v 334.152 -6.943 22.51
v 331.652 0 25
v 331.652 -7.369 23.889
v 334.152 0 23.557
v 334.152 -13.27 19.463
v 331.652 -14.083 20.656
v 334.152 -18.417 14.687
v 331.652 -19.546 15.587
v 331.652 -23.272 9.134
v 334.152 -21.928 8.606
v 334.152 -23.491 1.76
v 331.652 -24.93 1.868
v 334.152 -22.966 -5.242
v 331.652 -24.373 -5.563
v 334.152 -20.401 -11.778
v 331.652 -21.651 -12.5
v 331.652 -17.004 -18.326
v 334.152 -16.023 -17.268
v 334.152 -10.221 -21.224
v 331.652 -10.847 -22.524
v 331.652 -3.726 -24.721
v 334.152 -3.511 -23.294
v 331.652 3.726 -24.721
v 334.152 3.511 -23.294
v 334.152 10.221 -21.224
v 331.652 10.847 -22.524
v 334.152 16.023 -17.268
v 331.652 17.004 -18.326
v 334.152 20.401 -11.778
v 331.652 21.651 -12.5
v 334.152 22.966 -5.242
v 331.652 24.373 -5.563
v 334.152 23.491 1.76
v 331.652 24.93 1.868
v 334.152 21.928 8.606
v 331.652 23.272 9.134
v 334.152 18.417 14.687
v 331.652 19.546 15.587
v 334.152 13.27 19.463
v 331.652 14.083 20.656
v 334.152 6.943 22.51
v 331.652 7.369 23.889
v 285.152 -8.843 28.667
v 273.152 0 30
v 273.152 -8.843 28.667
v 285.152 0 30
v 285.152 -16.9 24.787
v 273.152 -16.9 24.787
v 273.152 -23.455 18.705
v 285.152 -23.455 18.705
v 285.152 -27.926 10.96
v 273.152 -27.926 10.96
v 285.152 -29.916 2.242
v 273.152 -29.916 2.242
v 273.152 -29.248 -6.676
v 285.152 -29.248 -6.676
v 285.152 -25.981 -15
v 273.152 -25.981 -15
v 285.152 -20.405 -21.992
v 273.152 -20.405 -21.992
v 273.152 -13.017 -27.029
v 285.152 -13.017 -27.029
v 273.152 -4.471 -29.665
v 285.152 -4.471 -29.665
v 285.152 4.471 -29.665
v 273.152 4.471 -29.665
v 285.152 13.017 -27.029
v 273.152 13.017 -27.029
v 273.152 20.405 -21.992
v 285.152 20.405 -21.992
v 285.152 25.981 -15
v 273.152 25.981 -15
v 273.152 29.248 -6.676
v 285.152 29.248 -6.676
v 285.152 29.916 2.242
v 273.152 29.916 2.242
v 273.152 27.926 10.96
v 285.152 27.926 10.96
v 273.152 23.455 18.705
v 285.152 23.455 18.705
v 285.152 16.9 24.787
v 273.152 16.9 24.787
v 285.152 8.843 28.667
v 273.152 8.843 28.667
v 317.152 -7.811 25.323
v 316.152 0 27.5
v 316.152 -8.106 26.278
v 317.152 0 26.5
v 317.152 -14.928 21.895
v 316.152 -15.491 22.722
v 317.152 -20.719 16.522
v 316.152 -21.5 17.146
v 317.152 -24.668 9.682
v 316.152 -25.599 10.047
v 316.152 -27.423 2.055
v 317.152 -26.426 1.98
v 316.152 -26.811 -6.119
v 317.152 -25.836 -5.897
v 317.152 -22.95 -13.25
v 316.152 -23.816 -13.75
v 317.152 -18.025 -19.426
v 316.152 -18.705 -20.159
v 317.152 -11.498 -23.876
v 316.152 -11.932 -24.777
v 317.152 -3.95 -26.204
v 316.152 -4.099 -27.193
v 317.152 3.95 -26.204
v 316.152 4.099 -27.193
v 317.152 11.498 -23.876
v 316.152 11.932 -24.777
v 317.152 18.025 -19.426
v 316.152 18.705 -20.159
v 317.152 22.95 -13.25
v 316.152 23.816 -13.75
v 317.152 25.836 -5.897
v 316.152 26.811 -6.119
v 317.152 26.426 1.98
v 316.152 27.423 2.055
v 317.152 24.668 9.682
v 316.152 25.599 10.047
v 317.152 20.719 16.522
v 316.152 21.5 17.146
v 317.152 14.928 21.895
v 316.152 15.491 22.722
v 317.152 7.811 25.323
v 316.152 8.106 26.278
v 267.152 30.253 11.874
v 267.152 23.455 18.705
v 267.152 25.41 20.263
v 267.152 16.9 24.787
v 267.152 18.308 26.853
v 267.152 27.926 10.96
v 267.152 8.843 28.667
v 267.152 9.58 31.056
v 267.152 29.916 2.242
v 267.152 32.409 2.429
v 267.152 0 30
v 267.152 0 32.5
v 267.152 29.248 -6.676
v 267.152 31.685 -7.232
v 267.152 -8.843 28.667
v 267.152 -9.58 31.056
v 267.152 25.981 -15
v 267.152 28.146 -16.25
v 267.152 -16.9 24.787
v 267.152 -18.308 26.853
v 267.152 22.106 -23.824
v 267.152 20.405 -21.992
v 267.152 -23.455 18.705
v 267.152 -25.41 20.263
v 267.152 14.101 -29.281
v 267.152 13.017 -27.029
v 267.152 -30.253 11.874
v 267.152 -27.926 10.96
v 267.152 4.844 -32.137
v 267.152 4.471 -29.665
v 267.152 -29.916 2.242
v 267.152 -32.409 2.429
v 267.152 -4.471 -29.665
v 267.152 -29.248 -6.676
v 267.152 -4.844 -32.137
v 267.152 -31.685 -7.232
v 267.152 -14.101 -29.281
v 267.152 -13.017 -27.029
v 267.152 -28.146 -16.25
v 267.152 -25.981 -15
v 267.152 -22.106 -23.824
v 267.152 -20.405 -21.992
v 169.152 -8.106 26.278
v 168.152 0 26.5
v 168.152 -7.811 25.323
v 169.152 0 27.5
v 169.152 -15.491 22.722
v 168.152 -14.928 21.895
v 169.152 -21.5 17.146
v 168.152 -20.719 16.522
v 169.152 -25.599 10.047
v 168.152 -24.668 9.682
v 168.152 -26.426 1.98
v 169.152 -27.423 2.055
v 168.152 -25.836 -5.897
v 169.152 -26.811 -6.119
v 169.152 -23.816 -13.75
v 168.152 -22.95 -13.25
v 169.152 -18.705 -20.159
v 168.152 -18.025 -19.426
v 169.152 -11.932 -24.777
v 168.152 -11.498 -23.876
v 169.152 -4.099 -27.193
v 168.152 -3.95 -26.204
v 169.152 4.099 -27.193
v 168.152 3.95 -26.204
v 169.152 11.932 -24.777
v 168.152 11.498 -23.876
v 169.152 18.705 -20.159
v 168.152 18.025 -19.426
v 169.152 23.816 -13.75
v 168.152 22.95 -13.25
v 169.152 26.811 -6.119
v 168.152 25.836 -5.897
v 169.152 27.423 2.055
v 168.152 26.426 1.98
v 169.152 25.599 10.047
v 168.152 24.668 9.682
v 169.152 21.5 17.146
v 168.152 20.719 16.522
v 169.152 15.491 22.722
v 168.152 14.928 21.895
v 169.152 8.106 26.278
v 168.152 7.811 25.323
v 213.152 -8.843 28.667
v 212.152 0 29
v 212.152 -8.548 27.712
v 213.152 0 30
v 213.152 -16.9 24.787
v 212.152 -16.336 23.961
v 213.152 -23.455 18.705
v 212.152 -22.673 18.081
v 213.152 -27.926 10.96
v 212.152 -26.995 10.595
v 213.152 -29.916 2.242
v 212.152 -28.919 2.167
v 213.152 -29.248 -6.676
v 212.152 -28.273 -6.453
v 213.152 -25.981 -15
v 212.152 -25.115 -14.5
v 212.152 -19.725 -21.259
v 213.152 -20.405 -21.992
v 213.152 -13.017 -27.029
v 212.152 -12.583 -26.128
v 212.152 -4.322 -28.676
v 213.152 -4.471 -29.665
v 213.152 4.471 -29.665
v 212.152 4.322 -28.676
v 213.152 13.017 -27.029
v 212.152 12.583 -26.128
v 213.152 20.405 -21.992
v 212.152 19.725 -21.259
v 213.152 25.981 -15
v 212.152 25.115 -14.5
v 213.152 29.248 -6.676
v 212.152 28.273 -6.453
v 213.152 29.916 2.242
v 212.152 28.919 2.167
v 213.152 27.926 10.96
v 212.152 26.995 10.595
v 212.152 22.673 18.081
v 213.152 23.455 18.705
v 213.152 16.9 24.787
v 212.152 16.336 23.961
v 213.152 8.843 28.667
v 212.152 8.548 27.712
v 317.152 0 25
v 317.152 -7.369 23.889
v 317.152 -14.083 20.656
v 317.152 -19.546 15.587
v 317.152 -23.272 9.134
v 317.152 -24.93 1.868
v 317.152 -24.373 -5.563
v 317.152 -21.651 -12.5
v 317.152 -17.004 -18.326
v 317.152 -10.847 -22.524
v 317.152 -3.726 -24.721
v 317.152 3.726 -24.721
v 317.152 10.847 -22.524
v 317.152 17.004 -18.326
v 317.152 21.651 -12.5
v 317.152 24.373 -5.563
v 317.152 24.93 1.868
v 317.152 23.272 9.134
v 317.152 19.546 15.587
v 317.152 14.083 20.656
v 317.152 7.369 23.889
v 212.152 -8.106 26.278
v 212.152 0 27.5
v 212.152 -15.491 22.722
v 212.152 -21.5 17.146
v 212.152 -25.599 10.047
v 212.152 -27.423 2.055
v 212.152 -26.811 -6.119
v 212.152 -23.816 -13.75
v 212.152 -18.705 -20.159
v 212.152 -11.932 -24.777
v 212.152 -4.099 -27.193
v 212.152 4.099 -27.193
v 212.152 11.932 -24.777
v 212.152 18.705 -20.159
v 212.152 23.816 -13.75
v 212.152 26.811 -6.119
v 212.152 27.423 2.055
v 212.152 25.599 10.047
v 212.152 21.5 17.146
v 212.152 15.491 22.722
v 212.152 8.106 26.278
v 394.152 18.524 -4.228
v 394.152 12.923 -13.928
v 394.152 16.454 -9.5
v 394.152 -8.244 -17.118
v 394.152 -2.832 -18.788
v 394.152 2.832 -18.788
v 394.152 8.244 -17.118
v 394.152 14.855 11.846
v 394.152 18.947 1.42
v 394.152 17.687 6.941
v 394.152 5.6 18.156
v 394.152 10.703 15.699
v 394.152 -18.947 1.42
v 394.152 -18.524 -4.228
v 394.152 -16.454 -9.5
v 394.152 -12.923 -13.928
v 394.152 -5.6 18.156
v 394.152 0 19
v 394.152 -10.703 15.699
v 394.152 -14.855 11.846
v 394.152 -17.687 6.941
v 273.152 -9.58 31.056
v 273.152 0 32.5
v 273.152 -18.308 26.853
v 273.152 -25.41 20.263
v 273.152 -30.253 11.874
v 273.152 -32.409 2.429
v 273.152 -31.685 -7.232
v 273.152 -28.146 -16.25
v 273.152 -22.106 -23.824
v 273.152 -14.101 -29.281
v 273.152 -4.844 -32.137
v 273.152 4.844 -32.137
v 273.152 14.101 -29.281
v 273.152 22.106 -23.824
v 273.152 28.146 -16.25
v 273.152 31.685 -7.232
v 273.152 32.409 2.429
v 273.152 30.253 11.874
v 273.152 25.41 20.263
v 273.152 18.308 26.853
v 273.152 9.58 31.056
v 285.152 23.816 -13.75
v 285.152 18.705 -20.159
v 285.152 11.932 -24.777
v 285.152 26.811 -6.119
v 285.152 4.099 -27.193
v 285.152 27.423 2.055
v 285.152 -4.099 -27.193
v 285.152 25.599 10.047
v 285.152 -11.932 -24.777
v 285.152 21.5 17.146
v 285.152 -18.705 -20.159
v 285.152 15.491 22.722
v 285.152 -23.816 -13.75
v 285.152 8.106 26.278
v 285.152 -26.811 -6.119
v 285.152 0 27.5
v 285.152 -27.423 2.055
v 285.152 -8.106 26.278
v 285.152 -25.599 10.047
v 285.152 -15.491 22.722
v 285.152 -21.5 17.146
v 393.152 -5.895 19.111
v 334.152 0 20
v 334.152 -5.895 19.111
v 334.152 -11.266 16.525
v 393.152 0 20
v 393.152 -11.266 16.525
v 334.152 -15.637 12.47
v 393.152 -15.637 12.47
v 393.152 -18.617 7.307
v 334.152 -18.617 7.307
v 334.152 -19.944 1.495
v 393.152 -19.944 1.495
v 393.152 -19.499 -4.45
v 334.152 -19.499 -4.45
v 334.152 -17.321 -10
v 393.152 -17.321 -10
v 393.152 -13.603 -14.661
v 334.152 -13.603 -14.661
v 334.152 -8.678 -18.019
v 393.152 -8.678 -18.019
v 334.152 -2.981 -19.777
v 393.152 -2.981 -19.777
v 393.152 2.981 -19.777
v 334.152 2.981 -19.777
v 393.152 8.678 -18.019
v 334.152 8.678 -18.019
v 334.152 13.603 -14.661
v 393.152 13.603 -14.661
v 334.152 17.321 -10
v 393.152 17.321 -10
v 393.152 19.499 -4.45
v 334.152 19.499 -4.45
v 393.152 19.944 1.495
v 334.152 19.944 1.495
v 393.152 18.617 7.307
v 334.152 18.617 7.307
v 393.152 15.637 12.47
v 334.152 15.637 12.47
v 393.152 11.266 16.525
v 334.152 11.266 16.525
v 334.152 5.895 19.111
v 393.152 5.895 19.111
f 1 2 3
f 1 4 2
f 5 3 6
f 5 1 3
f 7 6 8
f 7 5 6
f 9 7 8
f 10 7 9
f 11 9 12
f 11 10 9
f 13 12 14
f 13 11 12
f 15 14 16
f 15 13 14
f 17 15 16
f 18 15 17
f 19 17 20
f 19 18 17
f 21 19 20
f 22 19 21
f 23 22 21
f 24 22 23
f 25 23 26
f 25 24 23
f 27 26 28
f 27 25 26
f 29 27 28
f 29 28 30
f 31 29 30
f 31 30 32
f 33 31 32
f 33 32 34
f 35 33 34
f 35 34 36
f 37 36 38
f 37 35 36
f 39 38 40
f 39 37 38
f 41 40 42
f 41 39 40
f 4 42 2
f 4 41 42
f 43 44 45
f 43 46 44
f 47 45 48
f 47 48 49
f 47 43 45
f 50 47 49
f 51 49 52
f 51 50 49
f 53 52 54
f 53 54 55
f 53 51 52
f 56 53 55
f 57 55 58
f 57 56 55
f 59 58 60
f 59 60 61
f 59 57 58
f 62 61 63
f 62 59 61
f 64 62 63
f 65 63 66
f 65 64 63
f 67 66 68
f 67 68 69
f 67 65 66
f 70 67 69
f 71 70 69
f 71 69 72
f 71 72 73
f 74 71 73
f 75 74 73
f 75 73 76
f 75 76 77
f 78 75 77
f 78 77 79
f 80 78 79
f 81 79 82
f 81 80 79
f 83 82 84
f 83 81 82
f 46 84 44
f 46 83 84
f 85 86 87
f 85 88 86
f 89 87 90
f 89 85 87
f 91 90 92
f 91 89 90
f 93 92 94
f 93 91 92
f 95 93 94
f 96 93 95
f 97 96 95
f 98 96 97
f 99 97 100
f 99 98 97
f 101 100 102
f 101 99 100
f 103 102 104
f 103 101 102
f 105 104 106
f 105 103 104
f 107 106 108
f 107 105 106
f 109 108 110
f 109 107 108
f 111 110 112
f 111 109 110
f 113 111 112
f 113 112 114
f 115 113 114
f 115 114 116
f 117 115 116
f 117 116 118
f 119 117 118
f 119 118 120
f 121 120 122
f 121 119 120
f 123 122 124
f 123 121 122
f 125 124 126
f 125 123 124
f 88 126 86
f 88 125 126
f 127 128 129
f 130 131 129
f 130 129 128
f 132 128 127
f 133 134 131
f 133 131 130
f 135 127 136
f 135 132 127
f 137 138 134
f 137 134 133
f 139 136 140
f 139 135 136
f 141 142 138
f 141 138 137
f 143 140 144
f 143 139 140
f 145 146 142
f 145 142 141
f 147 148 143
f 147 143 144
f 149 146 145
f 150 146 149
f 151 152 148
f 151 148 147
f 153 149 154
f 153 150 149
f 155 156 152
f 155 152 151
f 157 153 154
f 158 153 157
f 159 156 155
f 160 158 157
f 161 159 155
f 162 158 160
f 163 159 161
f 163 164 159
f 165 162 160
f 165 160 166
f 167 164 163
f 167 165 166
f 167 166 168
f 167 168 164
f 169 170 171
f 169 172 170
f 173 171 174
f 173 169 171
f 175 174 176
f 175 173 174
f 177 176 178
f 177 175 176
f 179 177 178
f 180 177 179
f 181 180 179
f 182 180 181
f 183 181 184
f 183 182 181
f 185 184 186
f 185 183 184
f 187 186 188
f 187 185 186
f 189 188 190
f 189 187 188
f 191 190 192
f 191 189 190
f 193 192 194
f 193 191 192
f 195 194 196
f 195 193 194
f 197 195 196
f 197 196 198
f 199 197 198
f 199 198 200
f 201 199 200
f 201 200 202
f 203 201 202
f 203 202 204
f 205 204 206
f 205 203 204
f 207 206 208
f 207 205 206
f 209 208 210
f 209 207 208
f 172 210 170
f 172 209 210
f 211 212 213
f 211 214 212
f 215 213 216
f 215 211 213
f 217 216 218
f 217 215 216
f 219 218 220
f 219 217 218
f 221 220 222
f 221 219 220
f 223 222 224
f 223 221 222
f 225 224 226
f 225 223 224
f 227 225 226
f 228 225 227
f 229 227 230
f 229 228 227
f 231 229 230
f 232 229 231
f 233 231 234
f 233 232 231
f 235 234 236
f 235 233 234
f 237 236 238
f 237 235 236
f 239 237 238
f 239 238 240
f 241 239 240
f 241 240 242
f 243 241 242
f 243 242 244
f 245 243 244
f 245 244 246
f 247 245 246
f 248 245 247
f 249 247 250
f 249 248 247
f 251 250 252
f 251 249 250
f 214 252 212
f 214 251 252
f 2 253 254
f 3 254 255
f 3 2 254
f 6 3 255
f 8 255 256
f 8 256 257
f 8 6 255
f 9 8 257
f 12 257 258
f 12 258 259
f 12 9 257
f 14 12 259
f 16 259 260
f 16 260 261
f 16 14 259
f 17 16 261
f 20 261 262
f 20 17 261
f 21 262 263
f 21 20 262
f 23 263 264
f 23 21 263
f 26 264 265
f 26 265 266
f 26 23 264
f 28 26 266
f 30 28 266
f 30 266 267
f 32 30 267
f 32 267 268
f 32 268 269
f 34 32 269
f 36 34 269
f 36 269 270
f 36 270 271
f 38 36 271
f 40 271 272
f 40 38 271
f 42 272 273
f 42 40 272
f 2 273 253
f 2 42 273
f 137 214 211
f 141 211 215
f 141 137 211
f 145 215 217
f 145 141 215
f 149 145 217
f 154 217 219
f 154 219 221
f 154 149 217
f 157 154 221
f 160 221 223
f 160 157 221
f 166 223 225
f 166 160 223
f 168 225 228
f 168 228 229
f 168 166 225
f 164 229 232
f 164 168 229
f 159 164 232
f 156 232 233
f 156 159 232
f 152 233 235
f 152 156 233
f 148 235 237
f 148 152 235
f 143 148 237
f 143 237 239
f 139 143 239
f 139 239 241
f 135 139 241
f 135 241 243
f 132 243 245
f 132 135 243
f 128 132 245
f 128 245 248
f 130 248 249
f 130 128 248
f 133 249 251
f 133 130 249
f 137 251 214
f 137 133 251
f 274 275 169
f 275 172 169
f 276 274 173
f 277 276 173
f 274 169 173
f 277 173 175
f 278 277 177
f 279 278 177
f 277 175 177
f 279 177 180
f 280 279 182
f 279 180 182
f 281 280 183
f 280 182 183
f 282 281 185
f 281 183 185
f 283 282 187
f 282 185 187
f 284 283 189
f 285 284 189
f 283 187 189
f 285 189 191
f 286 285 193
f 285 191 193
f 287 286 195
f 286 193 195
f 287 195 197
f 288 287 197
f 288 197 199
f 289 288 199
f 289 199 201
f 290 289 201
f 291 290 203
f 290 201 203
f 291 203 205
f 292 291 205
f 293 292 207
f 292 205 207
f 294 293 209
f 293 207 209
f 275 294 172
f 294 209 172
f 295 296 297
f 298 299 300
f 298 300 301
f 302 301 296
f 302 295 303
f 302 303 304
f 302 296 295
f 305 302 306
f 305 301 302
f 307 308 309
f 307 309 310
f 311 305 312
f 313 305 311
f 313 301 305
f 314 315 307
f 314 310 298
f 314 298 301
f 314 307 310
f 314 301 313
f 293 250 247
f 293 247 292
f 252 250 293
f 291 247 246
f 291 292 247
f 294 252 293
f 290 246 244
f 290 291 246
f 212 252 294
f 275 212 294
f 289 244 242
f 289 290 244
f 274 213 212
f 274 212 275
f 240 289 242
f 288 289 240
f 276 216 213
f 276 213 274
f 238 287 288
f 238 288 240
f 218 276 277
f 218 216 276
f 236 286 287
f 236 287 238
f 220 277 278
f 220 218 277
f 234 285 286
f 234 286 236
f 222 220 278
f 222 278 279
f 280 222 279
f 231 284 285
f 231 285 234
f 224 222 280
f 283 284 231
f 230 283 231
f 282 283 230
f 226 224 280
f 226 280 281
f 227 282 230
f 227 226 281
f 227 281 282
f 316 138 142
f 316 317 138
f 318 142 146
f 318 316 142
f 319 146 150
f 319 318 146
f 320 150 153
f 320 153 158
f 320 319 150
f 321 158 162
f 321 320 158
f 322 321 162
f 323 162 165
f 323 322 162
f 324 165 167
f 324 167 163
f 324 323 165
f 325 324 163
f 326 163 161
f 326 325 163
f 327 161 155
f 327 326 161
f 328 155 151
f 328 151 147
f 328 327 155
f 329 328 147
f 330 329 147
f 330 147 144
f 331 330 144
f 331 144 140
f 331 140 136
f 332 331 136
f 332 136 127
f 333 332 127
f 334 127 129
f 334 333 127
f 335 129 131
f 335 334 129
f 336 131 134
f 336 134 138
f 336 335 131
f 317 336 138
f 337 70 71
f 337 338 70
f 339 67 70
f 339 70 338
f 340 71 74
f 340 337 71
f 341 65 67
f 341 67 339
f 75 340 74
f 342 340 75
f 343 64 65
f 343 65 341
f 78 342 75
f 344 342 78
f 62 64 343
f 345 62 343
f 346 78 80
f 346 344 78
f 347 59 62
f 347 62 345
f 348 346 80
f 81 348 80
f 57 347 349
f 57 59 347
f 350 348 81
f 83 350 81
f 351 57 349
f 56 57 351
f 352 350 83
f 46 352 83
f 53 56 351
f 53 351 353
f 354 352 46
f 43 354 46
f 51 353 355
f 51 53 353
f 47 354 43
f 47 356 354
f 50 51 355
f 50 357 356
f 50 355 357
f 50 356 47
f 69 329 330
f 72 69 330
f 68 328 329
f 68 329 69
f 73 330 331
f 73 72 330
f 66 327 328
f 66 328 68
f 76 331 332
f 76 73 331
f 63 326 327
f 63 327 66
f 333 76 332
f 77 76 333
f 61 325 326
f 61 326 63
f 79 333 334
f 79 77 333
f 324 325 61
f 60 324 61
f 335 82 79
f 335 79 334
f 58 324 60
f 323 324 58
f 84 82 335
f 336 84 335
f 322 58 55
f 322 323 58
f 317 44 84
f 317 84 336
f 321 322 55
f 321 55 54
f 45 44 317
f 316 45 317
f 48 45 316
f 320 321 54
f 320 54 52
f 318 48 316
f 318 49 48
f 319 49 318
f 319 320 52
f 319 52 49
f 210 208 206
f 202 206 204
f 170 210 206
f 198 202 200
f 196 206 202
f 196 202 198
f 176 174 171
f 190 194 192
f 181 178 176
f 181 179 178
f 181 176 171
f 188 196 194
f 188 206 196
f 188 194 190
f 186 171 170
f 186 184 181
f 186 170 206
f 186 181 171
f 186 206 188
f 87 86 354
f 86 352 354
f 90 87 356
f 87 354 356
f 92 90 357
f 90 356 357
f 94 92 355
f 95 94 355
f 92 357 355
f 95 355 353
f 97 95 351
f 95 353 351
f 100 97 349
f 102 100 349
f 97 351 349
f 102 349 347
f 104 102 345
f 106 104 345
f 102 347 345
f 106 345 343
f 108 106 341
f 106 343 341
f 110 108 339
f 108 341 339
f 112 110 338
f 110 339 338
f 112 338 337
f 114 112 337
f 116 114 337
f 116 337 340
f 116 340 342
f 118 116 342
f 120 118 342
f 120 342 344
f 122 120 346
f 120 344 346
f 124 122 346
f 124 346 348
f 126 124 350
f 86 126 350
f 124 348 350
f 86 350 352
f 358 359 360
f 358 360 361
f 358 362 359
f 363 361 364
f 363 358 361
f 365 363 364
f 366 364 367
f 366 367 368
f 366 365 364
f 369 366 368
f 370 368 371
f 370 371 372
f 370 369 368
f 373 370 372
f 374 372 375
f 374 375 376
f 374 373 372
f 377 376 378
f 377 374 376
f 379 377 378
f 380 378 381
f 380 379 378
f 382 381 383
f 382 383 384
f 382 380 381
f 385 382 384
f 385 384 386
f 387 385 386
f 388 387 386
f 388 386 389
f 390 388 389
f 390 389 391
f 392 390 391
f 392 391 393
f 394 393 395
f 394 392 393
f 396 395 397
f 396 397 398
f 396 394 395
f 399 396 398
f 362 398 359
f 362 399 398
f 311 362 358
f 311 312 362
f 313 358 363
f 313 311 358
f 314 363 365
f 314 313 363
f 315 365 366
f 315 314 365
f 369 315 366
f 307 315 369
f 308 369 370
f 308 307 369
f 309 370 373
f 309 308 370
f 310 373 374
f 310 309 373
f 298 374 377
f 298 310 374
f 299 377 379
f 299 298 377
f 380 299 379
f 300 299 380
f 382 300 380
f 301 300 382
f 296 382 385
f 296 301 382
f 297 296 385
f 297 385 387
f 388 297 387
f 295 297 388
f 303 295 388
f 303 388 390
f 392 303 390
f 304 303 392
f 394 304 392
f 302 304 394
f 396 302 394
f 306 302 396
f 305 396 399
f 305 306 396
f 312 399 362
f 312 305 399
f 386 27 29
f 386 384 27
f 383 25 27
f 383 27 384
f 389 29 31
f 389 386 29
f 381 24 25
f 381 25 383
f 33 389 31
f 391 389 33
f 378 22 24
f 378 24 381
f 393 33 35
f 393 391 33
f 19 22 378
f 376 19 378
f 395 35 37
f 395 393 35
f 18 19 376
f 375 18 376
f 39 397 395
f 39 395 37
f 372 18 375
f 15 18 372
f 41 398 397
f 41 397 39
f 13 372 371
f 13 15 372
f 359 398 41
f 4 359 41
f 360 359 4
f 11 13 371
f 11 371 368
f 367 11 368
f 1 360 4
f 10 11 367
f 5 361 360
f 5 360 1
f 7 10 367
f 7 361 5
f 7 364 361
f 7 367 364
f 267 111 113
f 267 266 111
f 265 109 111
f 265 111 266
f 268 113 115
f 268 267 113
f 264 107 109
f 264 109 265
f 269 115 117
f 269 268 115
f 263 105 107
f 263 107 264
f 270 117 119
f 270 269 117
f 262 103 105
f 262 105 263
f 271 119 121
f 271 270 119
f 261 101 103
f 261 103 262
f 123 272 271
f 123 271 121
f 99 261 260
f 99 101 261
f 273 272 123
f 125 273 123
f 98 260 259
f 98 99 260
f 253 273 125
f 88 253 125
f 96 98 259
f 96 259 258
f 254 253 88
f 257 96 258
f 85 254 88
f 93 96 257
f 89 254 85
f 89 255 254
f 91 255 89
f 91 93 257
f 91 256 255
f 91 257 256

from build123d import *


with BuildPart() as part:
    # Skizze1 → Rotation1 (revolve)
    with BuildSketch(Plane.XY, mode=Mode.PRIVATE) as rotation1_sk:
        Polygon((168.152402442, 0), (168.152402442, 26.5), (169.152402442, 27.5), (184.152402442, 27.5), (212.152402442, 27.5), (212.152402442, 29), (213.152402442, 30), (267.152402442, 30), (267.152402442, 32.5), (273.152402442, 32.5), (273.152402442, 30), (285.152402442, 30), (285.152402442, 27.5), (297.652402442, 27.5), (316.152402442, 27.5), (317.152402442, 26.5), (317.152402442, 25), (331.652402442, 25), (334.152402442, 23.556624327), (334.152402442, 20), (393.152402442, 20), (394.152402442, 19), (394.152402442, 0), align=None)
    revolve(rotation1_sk.sketch.rotate(Axis((168.152402442, 0, 0), (1, 0, 0)), 90), axis=Axis((168.152402442, 0, 0), (1, 0, 0)))  # turned: the seam where the file's is


solid = part.part
